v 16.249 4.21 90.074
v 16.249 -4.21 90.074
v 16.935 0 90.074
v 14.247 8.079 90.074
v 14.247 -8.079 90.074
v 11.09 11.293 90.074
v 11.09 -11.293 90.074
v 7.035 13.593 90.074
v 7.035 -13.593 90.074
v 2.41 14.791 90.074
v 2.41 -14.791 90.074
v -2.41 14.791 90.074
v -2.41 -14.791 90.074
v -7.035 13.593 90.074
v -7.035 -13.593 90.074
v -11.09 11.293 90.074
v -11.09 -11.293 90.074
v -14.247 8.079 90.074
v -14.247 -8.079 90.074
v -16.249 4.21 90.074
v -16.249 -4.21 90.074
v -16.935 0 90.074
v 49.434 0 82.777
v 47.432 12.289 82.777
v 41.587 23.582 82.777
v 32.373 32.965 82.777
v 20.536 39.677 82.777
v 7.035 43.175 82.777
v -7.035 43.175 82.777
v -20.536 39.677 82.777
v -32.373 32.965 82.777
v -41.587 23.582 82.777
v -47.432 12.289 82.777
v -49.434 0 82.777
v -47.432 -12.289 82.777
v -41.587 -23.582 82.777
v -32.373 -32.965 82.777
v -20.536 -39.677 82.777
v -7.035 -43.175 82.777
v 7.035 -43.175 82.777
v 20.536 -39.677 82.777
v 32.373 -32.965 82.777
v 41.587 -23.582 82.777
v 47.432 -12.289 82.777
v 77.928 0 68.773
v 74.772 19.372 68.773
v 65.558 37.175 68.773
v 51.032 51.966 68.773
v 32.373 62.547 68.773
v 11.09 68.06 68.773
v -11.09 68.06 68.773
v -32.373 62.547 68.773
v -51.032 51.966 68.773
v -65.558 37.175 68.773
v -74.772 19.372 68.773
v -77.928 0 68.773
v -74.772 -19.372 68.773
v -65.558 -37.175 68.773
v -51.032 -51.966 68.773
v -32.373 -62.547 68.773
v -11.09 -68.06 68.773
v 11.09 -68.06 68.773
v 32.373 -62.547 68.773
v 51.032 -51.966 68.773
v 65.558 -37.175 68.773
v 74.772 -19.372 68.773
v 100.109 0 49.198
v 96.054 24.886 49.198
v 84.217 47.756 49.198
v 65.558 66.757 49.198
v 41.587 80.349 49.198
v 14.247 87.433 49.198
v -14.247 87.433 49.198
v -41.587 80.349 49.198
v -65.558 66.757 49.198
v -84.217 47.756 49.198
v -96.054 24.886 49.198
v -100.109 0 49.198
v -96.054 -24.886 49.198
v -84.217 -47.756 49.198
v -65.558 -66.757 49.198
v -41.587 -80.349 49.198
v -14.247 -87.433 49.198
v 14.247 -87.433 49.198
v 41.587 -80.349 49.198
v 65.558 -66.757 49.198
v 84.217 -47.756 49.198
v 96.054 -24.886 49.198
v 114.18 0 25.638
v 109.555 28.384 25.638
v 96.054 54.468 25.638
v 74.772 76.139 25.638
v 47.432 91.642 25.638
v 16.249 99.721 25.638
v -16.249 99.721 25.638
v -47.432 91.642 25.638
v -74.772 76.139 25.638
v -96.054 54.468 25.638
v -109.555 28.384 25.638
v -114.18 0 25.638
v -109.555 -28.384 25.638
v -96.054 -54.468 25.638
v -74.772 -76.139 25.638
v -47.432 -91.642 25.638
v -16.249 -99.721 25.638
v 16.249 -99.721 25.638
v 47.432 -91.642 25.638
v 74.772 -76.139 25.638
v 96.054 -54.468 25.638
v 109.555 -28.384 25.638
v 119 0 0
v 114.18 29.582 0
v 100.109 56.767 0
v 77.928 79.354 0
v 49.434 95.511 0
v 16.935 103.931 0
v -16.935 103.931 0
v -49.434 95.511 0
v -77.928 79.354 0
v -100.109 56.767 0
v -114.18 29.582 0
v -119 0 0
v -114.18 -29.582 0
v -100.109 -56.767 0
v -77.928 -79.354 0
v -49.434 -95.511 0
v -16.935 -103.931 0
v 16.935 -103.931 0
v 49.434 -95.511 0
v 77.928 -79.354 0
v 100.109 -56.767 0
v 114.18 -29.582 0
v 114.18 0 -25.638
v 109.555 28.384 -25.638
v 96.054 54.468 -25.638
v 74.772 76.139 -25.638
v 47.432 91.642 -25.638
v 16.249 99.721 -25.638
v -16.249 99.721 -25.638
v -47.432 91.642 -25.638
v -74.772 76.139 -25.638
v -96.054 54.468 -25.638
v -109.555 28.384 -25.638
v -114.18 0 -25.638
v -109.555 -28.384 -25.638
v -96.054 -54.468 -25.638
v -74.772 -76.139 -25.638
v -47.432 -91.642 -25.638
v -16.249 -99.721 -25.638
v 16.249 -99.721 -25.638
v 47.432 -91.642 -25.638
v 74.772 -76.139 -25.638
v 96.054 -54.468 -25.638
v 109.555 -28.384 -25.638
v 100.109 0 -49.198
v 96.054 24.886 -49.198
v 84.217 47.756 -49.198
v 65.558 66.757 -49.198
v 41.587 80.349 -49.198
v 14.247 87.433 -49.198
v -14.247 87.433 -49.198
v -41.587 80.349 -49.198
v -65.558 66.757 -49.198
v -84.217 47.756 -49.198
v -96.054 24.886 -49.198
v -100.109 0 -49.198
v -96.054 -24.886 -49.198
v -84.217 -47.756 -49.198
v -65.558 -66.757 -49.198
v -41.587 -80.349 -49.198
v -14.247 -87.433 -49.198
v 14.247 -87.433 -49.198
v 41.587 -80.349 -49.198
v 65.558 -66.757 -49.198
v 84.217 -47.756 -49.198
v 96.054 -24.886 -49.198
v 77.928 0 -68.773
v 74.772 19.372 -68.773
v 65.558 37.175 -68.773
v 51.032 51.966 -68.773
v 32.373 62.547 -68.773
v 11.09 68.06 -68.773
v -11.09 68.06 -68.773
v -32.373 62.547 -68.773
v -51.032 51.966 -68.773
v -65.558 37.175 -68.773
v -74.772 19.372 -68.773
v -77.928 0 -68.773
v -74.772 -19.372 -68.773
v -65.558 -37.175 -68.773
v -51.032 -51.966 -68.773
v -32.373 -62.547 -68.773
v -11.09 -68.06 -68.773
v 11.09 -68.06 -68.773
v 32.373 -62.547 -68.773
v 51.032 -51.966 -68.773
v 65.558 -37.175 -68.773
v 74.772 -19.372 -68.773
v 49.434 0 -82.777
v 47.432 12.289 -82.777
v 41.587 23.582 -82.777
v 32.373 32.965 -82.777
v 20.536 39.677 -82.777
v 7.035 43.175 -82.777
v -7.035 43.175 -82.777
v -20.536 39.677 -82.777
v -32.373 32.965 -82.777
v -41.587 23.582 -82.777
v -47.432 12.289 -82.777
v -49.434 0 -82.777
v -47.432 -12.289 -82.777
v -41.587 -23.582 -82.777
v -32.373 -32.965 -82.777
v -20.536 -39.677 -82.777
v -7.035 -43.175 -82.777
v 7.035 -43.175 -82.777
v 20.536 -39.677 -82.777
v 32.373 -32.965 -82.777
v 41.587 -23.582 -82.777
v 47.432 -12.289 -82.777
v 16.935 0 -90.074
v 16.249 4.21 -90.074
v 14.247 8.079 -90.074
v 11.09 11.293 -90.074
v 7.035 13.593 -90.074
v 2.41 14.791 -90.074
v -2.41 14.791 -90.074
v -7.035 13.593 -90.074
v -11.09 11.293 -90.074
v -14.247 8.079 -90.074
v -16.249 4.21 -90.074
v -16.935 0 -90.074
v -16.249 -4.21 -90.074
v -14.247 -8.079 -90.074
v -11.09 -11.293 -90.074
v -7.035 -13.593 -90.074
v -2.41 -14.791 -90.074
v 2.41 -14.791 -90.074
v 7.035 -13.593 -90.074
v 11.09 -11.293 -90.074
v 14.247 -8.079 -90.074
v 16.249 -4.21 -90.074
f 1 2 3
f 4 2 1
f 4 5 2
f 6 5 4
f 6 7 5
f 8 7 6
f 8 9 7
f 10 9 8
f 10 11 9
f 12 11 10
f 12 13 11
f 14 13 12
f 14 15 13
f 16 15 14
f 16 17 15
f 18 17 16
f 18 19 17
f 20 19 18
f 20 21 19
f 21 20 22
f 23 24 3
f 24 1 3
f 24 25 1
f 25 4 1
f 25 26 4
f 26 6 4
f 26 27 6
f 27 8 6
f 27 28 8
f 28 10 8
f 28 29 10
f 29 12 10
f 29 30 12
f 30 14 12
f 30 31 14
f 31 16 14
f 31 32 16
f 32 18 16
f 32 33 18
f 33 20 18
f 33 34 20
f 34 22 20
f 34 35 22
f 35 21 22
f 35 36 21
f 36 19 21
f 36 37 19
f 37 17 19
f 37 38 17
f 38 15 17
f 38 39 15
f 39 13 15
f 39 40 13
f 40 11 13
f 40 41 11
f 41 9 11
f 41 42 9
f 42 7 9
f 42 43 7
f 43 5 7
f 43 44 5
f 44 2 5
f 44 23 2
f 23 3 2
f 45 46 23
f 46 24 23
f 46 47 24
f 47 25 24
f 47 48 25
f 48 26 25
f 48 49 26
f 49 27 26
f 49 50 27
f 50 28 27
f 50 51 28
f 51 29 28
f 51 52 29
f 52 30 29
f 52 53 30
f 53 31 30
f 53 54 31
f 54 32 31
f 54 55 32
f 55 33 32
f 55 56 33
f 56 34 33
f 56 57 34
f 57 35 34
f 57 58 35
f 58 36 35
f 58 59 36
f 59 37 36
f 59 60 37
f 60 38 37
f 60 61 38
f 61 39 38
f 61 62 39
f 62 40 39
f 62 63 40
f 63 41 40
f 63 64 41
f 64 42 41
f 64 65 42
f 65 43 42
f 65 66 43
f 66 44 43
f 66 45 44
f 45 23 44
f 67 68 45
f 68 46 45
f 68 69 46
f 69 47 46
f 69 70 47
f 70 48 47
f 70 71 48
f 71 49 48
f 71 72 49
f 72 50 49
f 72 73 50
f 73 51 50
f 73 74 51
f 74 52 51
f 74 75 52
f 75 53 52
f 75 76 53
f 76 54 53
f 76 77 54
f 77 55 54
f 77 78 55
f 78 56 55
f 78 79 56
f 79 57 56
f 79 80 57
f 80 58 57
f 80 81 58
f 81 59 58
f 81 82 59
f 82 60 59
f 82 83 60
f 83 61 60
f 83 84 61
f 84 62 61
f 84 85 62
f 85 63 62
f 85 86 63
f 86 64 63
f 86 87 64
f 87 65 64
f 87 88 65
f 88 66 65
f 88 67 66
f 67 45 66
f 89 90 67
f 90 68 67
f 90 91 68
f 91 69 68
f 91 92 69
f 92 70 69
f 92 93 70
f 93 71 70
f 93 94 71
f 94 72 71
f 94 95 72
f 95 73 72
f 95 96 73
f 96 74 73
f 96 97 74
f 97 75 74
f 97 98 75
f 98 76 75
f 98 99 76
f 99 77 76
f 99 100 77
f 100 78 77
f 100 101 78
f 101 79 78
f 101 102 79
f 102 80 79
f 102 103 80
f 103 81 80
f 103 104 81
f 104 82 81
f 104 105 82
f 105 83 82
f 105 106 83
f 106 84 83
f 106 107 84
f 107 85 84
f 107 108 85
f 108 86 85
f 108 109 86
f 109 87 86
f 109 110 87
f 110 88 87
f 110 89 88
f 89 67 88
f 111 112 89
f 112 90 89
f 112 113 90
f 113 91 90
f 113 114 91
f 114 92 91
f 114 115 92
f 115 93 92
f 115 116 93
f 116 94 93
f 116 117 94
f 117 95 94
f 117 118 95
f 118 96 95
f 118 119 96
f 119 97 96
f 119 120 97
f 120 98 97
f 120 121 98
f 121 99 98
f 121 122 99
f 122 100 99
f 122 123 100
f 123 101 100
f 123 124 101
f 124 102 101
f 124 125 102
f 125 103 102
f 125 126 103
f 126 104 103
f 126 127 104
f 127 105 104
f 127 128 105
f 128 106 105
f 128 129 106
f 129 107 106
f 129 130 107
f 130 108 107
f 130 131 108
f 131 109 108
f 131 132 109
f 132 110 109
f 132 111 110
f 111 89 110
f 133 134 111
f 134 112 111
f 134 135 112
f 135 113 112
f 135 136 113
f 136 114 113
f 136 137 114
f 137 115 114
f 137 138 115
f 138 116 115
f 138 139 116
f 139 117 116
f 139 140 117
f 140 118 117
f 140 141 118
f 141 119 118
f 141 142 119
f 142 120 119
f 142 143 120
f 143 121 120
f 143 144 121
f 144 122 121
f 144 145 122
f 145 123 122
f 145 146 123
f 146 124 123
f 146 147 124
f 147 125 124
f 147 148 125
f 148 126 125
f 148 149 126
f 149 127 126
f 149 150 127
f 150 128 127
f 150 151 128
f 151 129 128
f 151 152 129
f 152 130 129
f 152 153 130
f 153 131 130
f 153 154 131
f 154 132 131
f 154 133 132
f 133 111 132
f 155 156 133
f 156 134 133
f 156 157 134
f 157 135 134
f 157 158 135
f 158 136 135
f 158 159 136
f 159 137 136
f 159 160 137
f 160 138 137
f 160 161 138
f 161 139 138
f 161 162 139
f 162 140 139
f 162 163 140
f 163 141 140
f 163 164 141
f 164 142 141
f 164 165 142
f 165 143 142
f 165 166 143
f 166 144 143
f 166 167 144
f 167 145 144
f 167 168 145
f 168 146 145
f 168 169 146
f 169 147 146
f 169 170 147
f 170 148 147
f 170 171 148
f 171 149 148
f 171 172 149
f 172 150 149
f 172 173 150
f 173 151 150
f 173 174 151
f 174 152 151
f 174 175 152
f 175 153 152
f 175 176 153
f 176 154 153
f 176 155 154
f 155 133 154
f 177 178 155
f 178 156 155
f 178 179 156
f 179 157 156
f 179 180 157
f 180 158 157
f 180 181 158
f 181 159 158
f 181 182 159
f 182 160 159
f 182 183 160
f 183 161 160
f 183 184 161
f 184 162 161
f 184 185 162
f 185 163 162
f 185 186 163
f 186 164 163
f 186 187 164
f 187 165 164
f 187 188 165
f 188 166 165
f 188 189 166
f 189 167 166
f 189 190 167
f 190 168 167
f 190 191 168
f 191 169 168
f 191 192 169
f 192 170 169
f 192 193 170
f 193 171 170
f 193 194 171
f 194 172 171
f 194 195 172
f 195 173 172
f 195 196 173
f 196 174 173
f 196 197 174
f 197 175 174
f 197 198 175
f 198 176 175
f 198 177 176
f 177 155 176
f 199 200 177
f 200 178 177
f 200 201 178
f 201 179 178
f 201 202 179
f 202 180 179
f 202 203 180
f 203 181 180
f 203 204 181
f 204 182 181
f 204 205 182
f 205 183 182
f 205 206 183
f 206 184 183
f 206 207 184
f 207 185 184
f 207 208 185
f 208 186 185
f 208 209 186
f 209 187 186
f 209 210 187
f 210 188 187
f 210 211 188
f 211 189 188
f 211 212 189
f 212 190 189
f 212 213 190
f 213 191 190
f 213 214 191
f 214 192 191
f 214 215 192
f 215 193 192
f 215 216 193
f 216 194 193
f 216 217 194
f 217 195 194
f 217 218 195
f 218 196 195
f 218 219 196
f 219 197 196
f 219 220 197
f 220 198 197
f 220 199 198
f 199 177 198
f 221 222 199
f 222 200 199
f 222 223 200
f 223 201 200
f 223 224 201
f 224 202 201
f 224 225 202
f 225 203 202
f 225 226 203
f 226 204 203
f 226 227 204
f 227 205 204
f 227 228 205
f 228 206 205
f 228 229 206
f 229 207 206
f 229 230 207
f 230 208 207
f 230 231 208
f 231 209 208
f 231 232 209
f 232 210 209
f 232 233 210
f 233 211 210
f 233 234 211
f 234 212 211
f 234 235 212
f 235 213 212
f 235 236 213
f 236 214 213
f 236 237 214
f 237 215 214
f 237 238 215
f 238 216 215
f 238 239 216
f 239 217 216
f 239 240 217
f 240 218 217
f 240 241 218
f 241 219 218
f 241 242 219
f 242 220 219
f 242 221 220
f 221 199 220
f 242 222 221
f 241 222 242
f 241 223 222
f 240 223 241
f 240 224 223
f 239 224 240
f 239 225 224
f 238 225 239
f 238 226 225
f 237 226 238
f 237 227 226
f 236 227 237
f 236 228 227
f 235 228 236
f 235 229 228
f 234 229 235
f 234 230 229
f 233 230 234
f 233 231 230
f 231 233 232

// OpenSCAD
// Generated by SolidPython 1.0.1 on 2020-07-29 00:46:53


scale(v = [17, 15, 13]) {
	sphere(r = 7);
}
/***********************************************
*********      SolidPython code:      **********
************************************************
 
# import packages: SolidPython
from solid import *
from solid.utils import *
from itertools import chain, combinations, permutations


class Resize:

    def __init__(self, scad_file):
        self.scad_file = scad_file
        #self.scad_file = import_scad(scad_file)
        # cone/cylinder param:
        self.r1 = 0
        self.r2 = 0
        self.h = 0
        # rectangular prism param:
        self.w = 0
        self.l = 0
        # ellipse param:
        self.r = 0

    # import OpenScad code (file name corresponds to shape)


    # classify shape + parameters
    def assign(self, param1, param2, param3):
        if self.scad_file == 'cone.scad':
            self.r1 = param1
            self.r2 = param2
            self.h = param3
        elif self.scad_file == 'cylinder.scad':
            self.r1 = param1
            self.r2 = param2
            self.h = param3
        elif self.scad_file == 'rectangularPrism.scad':
            self.h = param1
            self.l = param2
            self.w = param3
        else:
            self.r = param1
            self.h = param2

    # resize parameters
    def iterate(self):
        x = range(3, 20, 2)
        i = 1
        if self.scad_file == 'cone.scad':
            tempList = list(permutations(x, 2))
            for temp in tempList:
                param1 = temp[0]
                param2 = temp[1]
                filepath = 'produced_scad_files/' + 'cone' + str(param1) + '_' + str(param2) + '_' + '.scad'
                scad_render_to_file(cylinder(h=param1, r1=param2, r2=0), filepath)

        elif self.scad_file == 'cylinder.scad':
            tempList = list(permutations(x, 3))
            for temp in tempList:
                param1 = temp[0]
                param2 = temp[1]
                filepath = 'produced_scad_files/' + 'cylinder' + str(param1) + '_' + str(param2) + '_' + '.scad'
                scad_render_to_file(cylinder(h=param1, r1=param2, r2=param2), filepath)

        elif self.scad_file == 'rectangularPrism.scad':
            tempList = list(permutations(x, 3))
            for temp in tempList:
                param1 = temp[0]
                param2 = temp[1]
                param3 = temp[2]
                filepath = 'produced_scad_files/' + 'rectangularPrism' + str(param1) + '_' + str(param2) + '_' + str(
                    param3) + '.scad'
                scad_render_to_file(cube(size=(param1, param2, param3)), filepath)

        elif self.scad_file == 'ellipse.scad':
            tempList = list(permutations(x, 4))
            for temp in tempList:
                param1 = temp[0]
                param2 = temp[1]
                param3 = temp[2]
                param4 = temp[3]
                filepath = 'produced_scad_files/' + 'ellipse' + str(param1) + '_' + str(param2) + '_' + str(param3) + '_' + str(param4) + '.scad'
                scad_render_to_file(scale([param1, param2, param3])(sphere(r=param4)), filepath)

    def render_to_scadfile(self):
        scad_render_to_file(scad, 'example.scad') 
 
************************************************/
